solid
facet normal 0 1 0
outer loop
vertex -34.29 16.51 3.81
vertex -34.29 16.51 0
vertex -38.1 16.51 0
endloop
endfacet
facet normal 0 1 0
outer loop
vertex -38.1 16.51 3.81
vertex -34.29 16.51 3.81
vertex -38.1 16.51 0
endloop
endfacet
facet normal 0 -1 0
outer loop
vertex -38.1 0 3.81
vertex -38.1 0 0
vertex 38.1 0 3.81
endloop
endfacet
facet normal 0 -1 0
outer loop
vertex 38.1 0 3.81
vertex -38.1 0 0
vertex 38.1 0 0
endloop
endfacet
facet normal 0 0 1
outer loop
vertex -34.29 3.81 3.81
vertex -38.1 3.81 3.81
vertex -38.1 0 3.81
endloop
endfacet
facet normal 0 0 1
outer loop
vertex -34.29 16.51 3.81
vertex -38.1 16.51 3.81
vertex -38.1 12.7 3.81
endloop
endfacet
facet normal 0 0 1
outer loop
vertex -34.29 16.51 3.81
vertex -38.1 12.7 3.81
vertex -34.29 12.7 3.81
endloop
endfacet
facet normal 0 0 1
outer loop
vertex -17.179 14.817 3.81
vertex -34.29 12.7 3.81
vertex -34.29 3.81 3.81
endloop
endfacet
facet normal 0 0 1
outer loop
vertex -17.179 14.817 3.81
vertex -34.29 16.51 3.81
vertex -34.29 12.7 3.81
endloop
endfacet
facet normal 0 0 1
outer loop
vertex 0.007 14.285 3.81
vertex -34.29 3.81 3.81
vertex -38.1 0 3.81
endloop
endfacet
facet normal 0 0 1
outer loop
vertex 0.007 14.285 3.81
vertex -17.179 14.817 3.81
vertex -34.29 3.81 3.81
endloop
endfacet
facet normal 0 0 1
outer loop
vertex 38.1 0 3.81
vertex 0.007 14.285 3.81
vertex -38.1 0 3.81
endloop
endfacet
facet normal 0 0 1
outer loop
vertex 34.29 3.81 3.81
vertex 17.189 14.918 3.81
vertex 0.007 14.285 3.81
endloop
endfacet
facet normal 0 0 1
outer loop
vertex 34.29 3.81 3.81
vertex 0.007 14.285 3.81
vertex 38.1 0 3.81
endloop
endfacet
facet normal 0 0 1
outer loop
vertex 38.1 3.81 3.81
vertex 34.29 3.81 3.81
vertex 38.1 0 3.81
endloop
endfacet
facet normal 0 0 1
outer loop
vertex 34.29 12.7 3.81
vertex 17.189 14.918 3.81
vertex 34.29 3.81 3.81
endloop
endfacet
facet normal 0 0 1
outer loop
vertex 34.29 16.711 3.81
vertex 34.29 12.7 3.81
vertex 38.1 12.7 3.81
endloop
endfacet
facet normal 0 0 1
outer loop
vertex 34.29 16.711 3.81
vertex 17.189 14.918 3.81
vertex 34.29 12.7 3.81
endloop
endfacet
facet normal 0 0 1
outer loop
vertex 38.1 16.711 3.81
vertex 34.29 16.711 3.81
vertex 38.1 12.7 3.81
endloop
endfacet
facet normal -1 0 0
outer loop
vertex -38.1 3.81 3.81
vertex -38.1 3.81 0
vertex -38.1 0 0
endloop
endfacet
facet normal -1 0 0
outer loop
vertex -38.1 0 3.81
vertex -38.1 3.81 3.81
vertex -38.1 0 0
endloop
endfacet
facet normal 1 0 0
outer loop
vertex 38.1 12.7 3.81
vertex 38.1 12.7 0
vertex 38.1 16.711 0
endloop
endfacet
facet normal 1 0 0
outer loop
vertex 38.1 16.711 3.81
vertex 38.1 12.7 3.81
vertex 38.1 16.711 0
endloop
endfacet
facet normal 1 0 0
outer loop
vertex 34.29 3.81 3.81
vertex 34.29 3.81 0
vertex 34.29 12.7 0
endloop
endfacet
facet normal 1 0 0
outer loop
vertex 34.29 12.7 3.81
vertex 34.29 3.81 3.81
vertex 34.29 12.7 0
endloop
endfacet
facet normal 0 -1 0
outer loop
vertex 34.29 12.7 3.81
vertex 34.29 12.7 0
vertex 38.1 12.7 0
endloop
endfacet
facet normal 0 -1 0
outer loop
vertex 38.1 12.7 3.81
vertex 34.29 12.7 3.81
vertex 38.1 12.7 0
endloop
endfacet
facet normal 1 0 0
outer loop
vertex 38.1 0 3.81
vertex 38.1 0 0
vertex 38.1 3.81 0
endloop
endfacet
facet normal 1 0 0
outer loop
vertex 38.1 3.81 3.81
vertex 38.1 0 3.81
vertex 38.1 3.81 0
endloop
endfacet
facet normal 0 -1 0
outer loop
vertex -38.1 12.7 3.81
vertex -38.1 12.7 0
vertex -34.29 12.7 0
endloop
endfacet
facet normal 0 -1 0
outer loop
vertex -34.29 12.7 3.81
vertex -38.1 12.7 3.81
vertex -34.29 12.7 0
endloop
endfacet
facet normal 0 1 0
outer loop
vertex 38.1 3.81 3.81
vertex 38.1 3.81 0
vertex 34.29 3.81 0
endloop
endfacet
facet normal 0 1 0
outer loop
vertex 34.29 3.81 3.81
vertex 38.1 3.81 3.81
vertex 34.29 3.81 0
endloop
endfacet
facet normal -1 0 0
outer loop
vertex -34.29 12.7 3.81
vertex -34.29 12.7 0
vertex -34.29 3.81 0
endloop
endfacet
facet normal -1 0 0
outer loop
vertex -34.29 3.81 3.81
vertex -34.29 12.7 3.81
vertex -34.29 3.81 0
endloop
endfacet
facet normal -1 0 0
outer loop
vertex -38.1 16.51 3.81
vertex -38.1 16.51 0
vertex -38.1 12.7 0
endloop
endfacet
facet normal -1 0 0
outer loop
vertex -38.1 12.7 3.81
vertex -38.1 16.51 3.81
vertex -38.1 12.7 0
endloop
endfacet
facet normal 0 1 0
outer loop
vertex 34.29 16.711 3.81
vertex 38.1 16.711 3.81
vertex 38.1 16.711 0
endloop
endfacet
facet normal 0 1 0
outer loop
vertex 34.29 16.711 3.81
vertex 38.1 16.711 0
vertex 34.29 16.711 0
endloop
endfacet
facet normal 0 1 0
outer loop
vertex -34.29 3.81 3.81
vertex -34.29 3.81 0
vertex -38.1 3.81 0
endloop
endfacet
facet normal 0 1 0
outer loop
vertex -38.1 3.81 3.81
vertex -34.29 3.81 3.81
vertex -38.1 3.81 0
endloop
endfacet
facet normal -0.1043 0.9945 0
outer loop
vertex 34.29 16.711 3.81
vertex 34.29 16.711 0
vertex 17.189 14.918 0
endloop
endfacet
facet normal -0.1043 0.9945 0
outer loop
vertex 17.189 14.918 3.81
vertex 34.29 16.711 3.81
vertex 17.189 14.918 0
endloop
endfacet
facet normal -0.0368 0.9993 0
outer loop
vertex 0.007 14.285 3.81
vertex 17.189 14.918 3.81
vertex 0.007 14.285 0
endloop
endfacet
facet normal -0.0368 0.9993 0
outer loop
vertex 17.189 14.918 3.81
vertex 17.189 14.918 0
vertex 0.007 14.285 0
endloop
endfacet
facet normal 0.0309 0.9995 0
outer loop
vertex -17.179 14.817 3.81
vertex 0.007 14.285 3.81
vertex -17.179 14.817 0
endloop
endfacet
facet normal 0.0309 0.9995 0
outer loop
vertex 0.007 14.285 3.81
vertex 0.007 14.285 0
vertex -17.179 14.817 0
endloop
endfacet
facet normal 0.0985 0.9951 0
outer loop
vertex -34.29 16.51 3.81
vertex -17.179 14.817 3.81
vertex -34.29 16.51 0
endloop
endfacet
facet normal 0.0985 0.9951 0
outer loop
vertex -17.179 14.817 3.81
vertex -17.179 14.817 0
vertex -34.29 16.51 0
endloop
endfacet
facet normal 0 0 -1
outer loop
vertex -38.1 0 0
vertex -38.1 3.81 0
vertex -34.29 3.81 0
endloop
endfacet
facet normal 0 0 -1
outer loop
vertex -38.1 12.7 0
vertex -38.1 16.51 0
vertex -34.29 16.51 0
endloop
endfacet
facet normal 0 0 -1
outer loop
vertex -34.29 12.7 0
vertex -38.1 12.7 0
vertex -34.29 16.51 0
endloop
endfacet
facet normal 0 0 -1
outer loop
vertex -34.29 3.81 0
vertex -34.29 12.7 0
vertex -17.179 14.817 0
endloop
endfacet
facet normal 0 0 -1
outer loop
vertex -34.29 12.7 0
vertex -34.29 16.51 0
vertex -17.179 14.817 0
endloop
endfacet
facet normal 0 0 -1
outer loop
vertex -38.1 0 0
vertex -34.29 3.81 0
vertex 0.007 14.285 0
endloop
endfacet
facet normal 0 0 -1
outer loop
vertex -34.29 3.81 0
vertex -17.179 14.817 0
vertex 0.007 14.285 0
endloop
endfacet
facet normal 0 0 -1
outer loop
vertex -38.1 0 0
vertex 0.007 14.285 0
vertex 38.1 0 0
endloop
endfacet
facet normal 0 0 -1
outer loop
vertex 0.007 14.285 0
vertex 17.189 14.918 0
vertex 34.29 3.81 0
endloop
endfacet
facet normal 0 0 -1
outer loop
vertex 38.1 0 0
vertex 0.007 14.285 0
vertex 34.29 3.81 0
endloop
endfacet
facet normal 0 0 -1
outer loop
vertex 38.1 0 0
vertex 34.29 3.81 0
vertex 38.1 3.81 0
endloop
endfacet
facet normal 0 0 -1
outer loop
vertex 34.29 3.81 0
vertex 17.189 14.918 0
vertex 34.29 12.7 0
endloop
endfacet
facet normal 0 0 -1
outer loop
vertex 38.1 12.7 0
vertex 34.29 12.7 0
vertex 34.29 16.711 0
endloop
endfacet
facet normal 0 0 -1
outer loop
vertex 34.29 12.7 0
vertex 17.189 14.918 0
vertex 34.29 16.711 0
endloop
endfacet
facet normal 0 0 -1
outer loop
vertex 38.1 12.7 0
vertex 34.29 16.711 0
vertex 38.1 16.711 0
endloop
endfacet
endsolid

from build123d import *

# Parameters (mm, degrees)
BOSS_EXTRUDE1_DEPTH = 3.81


with BuildPart() as part:
    # Sketch1 → Boss-Extrude1 (new body)
    with BuildSketch(Plane.XY):
        with BuildLine():
            Line((-38.1, 0), (38.1, 0))
            Line((38.1, 0), (38.1, 3.81))
            Line((38.1, 3.81), (34.29, 3.81))
            Line((34.29, 3.81), (34.29, 12.7))
            Line((34.29, 12.7), (38.1, 12.7))
            Line((38.1, 12.7), (38.1, 16.711046713))
            Line((38.1, 16.711046713), (34.29, 16.711046713))
            ThreePointArc((34.29, 16.711046713), (0.006816557, 14.285295283), (-34.29, 16.51))
            Line((-34.29, 16.51), (-38.1, 16.51))
            Line((-38.1, 16.51), (-38.1, 12.7))
            Line((-38.1, 12.7), (-34.29, 12.7))
            Line((-34.29, 12.7), (-34.29, 3.81))
            Line((-34.29, 3.81), (-38.1, 3.81))
            Line((-38.1, 3.81), (-38.1, 0))
        make_face()
    extrude(amount=BOSS_EXTRUDE1_DEPTH)


solid = part.part
